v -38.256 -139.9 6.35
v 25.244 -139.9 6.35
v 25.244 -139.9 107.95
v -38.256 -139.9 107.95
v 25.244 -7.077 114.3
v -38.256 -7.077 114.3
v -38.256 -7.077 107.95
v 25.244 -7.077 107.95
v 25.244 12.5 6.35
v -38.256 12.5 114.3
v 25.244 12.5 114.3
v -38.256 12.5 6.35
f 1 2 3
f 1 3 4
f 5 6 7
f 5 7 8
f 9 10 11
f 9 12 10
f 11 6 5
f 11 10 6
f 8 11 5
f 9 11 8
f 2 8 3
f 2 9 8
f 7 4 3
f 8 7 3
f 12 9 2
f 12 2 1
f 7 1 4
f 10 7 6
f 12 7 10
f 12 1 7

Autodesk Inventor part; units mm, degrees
ref_plane "YZ Plane" through (0, 0, 0) normal (1, 0, 0) x (0, 1, 0)
ref_plane "XZ Plane" through (0, 0, 0) normal (0, 1, 0) x (-1, 0, 0)
ref_plane "XY Plane" through (0, 0, 0) normal (0, 0, 1) x (1, 0, 0)
sketch "Sketch1" plane through (0, 0, 0) normal (0, 0, 1) x (1, 0, 0)
  line L0 (-38.2565, 12.5) -> (25.2435, 12.5)
  line L1 (25.2435, 12.5) -> (25.2435, -139.9)
  line L2 (25.2435, -139.9) -> (-38.2565, -139.9)
  line L3 (-38.2565, -139.9) -> (-38.2565, 12.5)
  point P0 (0, 0)
  dimension "d0" = 63.5
  dimension "d1" = 152.4
extrude "Extrusion1" add sketch "Sketch1" along normal blind 114.3
sketch "Sketch2" plane through (0, 0, 114.3) normal (0, 0, 1) x (1, 0, 0)
  line L0 (-38.2565, -139.9) -> (-38.2565, 12.5) projected
  line L1 (25.2435, -139.9) -> (-38.2565, -139.9) projected
  line L2 (-38.2565, -7.0772) -> (25.2435, -7.0772)
  line L3 (25.2435, -7.0772) -> (25.2435, -139.9)
  line L4 (25.2435, -139.9) -> (-38.2565, -139.9)
  line L5 (-38.2565, -139.9) -> (-38.2565, -7.0772)
  point P0 (0, 0)
extrude "Extrusion2" cut sketch "Sketch2" against normal blind 6.35
sketch "Sketch3" plane through (0, 0, 0) normal (0, 0, -1) x (-1, 0, 0)
  line L0 (38.2565, 12.5) -> (-25.2435, 12.5) projected
  line L1 (-25.2435, 12.5) -> (-25.2435, -139.9) projected
  line L2 (-25.2435, -139.9) -> (38.2565, -139.9) projected
  line L3 (38.2565, -139.9) -> (38.2565, 12.5) projected
  point P0 (0, 0)
extrude "Extrusion3" cut sketch "Sketch3" against normal blind 6.35
properties part number "battery"
